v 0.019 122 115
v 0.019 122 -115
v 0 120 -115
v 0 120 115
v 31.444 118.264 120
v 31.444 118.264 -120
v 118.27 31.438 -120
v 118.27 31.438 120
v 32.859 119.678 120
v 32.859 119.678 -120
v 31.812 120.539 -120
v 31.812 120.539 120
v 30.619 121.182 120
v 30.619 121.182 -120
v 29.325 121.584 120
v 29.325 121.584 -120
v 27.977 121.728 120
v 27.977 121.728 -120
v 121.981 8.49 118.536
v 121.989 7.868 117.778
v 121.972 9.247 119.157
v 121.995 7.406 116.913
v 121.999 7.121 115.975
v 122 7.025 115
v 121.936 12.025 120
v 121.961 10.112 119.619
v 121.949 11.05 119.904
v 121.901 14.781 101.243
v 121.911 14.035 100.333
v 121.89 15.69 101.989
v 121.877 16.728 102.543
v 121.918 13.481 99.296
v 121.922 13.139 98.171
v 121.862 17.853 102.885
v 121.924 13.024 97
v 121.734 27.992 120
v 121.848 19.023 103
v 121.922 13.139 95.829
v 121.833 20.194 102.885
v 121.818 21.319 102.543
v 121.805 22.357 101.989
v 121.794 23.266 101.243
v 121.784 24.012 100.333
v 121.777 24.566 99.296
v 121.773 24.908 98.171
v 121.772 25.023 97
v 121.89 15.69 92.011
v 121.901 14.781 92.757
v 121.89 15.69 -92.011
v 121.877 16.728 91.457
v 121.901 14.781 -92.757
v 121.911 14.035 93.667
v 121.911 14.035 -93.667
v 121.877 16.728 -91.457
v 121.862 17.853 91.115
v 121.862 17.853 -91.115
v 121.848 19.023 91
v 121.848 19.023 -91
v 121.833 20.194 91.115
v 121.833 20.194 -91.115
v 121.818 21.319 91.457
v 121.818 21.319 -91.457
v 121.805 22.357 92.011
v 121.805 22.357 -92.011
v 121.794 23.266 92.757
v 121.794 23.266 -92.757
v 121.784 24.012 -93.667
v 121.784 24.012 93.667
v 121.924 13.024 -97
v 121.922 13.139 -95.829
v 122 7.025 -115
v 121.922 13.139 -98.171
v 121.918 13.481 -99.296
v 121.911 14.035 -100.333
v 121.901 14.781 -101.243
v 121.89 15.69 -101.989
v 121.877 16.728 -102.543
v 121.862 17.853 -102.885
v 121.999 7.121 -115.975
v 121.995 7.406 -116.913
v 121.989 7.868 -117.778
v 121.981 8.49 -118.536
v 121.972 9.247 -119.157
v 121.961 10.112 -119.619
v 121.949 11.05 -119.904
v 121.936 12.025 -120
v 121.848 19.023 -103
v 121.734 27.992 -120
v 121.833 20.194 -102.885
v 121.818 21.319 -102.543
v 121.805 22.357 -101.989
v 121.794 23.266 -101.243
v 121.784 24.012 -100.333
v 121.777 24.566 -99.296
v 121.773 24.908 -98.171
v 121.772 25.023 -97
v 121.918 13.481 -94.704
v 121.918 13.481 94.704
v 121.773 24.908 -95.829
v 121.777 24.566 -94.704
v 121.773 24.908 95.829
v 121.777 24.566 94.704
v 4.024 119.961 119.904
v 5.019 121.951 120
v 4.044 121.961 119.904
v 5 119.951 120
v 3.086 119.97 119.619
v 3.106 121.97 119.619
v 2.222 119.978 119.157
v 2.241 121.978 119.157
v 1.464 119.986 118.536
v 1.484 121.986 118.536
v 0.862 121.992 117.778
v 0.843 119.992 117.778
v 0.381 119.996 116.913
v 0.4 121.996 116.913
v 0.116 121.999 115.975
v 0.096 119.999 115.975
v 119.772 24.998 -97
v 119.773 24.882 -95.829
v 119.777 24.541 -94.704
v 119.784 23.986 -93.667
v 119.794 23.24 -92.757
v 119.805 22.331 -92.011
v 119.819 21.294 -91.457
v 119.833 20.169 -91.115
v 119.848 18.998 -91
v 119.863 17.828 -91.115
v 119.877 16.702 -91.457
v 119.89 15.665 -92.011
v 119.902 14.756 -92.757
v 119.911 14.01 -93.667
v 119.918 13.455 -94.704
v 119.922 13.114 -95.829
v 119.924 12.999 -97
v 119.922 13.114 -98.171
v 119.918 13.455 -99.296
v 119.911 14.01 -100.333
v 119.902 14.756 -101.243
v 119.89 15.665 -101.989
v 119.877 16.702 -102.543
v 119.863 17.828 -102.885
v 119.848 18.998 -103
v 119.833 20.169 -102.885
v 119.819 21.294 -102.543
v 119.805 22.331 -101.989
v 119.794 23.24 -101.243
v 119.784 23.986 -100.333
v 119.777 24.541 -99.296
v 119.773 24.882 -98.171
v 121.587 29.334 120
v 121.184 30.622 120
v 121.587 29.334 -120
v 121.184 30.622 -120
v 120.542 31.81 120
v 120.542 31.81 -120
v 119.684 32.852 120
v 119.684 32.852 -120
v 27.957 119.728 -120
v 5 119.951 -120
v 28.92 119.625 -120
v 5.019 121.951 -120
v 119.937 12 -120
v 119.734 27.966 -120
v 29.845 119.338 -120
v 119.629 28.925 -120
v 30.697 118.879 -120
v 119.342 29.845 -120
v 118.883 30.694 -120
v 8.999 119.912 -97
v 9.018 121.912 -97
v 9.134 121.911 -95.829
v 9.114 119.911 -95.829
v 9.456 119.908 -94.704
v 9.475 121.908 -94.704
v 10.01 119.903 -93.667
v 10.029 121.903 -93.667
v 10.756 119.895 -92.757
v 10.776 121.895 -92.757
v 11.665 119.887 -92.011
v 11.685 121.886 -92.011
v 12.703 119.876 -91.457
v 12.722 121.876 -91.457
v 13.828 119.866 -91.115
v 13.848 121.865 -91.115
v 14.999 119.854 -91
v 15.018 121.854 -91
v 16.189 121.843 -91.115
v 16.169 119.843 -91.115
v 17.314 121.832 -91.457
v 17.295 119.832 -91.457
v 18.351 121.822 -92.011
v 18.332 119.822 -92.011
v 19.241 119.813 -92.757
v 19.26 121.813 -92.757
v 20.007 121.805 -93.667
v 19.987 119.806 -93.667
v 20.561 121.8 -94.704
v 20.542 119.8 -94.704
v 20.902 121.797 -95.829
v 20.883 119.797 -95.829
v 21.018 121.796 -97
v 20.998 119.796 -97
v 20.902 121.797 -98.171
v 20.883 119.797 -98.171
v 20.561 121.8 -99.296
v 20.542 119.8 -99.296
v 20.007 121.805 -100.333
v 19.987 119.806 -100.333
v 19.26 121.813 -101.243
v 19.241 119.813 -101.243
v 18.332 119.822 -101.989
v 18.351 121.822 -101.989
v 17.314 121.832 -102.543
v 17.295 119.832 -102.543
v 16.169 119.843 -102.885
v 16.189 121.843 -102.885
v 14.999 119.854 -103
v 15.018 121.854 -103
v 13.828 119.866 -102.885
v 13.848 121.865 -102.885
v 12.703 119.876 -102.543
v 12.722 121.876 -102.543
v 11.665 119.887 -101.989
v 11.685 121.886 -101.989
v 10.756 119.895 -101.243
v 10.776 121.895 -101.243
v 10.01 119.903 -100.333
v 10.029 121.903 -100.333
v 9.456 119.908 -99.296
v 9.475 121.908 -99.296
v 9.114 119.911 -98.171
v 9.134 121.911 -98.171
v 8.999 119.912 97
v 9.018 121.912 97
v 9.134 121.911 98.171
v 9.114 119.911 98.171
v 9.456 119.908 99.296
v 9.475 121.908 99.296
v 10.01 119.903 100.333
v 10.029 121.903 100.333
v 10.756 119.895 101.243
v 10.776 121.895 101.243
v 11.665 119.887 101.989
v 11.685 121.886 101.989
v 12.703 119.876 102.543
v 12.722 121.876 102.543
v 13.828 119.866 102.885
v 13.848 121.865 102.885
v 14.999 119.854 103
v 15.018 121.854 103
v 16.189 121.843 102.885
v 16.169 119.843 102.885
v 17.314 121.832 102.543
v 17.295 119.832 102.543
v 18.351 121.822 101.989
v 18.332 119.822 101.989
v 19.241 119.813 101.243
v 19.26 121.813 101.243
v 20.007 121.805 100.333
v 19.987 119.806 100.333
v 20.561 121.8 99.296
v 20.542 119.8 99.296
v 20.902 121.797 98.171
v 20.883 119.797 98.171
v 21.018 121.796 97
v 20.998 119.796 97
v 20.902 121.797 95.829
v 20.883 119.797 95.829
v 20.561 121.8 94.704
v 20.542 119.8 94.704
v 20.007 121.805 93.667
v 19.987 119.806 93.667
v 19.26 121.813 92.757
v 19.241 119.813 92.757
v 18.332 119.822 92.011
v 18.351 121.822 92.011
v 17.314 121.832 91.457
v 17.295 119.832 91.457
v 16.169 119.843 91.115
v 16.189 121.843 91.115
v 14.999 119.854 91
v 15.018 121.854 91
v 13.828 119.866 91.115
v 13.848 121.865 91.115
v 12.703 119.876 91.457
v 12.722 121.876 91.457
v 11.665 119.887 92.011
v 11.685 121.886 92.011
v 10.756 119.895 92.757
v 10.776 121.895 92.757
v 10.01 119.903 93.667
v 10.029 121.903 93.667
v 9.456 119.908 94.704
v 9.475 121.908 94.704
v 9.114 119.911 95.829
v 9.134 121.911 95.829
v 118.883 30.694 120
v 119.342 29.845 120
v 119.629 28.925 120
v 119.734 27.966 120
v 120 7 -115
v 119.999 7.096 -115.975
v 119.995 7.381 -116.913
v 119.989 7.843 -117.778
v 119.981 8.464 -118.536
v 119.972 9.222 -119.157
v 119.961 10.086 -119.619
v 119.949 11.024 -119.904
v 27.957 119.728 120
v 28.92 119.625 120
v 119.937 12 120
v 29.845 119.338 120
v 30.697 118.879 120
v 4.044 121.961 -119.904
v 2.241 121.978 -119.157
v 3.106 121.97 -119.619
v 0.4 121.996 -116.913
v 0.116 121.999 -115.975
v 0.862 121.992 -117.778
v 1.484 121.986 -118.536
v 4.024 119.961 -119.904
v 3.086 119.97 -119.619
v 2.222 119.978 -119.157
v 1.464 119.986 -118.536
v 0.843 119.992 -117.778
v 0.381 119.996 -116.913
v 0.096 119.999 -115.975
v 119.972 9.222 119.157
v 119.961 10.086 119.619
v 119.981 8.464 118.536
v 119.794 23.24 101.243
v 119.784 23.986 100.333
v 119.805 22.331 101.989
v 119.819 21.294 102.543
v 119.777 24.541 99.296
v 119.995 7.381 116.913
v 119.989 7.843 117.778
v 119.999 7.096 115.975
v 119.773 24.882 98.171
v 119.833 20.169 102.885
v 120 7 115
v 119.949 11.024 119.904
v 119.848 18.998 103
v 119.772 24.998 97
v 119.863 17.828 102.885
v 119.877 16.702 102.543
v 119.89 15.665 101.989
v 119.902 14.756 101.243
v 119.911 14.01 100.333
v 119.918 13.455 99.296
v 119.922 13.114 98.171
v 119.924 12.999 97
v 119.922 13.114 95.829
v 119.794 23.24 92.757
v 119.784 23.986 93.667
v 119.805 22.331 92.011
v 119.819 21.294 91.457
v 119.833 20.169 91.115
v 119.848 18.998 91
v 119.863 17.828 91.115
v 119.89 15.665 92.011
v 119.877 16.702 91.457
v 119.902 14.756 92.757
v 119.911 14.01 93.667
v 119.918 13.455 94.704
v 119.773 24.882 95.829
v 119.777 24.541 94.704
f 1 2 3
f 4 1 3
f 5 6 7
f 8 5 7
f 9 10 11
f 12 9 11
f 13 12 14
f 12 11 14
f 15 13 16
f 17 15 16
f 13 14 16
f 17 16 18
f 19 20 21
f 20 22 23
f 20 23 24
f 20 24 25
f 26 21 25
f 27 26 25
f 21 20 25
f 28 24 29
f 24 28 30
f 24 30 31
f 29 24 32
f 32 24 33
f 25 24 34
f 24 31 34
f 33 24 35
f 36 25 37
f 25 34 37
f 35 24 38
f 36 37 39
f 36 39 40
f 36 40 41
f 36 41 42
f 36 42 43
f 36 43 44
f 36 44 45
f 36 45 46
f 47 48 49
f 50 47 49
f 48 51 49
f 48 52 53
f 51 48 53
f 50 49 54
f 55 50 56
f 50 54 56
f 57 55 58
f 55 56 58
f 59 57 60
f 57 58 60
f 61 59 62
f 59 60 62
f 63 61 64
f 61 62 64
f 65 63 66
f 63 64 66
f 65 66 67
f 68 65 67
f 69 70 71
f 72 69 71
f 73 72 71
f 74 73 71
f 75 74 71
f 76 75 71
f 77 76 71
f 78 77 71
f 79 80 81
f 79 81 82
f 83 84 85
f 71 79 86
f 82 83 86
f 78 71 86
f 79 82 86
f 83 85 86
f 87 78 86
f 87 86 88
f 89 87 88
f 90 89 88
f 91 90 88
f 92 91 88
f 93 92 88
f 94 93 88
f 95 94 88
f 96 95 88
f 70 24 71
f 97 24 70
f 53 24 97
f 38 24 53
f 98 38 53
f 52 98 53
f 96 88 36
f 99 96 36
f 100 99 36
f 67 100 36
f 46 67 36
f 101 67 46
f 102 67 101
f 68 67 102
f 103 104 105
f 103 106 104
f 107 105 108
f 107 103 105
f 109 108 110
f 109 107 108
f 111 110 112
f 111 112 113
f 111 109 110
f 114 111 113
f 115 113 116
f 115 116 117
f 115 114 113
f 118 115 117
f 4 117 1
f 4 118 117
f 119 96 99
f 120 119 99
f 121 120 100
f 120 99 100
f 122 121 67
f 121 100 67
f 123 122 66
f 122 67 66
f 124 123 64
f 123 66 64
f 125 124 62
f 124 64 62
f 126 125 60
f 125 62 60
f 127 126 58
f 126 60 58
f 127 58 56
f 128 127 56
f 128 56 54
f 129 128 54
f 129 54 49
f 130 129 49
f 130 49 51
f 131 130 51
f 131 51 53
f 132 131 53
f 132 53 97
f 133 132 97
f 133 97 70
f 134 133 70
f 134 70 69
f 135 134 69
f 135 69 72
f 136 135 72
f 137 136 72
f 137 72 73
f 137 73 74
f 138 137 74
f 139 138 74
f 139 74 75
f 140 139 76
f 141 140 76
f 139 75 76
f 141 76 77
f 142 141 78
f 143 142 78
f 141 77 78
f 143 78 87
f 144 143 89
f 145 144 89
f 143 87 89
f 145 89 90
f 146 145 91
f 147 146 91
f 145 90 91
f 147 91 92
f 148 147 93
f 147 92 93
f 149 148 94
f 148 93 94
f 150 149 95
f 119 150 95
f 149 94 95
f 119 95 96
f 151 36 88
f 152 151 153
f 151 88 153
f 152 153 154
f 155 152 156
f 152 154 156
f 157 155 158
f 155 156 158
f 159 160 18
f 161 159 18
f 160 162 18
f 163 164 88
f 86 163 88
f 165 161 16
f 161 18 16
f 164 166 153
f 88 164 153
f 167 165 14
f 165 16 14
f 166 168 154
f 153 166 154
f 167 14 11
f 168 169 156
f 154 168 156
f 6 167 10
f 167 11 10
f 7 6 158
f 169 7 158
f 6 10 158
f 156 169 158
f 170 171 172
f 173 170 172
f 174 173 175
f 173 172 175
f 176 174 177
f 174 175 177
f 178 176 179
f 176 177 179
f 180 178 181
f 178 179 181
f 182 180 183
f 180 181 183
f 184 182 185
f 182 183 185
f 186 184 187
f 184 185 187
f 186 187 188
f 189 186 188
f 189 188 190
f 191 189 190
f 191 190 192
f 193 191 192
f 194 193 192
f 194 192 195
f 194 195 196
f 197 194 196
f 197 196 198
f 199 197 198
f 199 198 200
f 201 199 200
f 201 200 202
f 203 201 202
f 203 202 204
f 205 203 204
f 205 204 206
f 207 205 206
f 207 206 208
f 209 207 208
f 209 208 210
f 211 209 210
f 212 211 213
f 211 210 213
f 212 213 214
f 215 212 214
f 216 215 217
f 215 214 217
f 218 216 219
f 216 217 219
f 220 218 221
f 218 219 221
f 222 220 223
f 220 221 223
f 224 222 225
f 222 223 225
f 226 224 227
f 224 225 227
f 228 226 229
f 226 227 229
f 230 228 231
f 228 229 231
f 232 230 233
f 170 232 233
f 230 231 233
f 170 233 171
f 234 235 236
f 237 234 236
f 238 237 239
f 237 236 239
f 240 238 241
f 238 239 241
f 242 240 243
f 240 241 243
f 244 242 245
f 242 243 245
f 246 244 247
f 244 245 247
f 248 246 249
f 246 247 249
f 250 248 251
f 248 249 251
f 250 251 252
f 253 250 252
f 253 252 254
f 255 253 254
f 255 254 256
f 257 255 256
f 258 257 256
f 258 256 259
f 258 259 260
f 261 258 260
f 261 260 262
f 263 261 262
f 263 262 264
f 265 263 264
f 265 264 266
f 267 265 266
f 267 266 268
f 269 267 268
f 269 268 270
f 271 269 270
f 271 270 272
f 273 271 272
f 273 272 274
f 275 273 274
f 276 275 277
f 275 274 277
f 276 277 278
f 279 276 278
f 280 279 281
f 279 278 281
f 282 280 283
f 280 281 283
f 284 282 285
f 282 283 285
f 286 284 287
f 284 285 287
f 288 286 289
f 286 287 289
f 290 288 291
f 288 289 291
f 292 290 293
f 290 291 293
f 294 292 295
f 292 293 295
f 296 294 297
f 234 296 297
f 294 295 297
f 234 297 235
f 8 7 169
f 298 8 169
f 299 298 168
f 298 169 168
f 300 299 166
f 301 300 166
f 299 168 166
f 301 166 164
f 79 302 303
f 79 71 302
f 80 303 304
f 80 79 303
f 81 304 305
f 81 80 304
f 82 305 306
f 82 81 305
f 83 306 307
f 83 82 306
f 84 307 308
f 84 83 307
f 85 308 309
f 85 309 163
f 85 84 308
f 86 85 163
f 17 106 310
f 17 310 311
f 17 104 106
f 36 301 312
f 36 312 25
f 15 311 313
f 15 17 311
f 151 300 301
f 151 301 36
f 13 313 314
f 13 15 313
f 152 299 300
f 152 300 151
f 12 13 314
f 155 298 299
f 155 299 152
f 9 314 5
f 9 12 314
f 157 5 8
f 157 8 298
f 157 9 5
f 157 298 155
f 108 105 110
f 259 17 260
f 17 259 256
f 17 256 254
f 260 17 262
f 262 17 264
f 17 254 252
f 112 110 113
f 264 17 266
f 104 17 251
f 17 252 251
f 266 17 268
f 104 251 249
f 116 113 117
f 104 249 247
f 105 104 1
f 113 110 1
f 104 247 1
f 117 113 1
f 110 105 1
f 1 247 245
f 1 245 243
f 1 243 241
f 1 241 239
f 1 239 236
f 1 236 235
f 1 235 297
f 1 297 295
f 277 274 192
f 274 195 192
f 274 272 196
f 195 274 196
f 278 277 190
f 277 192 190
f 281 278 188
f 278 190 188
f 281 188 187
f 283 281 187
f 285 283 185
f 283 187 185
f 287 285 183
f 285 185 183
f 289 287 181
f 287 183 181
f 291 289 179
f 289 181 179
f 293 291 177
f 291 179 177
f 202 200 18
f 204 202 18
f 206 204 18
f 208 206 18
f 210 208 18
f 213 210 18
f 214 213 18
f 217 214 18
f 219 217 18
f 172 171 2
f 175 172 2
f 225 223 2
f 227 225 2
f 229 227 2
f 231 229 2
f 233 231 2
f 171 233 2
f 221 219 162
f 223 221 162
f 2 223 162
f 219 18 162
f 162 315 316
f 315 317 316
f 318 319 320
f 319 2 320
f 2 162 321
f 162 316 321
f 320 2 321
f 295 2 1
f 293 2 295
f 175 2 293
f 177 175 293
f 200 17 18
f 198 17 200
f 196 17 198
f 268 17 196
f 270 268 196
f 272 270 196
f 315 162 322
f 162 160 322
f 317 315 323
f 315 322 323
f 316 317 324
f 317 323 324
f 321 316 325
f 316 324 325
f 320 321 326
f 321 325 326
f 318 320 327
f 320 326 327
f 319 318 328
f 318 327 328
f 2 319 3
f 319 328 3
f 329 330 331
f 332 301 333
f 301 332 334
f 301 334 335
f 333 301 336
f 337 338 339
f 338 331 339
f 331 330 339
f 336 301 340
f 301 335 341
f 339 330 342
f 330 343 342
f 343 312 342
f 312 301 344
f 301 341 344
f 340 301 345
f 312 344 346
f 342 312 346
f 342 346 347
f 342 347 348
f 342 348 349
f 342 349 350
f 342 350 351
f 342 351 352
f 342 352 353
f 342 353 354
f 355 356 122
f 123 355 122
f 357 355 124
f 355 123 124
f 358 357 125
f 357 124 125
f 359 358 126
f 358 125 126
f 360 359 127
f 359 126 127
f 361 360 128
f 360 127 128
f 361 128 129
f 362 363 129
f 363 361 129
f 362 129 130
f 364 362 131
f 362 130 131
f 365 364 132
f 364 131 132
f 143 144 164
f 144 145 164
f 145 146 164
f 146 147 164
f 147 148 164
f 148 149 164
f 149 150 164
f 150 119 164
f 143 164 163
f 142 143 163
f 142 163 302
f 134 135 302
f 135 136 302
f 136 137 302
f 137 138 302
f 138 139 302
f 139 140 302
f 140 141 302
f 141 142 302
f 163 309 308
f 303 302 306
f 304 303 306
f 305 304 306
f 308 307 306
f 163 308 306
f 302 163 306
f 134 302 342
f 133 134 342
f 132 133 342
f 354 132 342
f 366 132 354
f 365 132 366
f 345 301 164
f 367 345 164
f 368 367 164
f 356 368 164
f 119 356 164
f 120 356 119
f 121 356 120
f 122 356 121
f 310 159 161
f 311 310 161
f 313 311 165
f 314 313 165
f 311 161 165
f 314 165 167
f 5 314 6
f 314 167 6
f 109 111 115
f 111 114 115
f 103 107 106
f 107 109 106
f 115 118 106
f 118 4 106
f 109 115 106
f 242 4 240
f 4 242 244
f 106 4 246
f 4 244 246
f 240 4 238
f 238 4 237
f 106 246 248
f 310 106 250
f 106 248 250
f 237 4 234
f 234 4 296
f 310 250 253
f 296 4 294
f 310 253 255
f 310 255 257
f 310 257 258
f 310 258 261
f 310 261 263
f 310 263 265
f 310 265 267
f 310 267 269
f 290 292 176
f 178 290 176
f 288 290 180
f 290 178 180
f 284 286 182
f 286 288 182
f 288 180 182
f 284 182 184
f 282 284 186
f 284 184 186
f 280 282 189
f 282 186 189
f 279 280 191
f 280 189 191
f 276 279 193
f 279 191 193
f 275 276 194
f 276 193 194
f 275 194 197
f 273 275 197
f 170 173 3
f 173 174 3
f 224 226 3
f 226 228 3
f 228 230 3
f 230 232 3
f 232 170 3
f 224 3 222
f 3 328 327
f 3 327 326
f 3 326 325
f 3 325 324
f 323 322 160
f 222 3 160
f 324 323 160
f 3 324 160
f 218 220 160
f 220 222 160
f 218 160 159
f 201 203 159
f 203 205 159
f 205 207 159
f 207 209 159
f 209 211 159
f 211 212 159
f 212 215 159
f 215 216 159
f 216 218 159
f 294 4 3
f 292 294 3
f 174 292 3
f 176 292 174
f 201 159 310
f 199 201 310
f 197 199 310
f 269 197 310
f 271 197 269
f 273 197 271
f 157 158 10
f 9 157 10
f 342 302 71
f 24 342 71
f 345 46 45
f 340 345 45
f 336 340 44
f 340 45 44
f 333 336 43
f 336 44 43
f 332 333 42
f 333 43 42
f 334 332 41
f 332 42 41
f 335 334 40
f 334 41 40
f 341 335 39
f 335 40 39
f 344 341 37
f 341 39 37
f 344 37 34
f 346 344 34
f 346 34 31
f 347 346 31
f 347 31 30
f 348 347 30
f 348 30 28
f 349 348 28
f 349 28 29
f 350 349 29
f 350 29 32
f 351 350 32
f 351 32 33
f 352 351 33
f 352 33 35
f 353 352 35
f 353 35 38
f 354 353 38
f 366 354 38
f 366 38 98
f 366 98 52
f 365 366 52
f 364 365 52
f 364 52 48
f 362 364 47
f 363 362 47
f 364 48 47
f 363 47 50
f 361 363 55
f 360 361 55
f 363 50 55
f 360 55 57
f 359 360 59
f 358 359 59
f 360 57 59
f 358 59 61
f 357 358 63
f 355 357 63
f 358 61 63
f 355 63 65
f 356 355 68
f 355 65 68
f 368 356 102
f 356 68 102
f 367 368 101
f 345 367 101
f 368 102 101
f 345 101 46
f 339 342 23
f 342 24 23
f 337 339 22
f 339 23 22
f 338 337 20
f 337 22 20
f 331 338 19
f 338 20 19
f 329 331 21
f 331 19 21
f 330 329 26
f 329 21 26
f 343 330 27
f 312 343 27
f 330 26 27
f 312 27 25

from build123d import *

# Parameters (mm, degrees)
ESTRUSIONE_SOTTILE1_DEPTH      = 120
ESTRUSIONE_SOTTILE1_DEPTH_BACK = 120
RACCORDO1_R                    = 5
RACCORDO2_R                    = 5
SCHIZZO8_R                     = 6
TAGLIO_ESTRUSIONE1_DEPTH       = 210.306999049
SCHIZZO7_R                     = 6
TAGLIO_ESTRUSIONE2_DEPTH       = 206.470737868


with BuildPart() as part:
    # Schizzo1 → Estrusione-Sottile1 (new, two sides: drawn at the far end of the back side and taken through both)
    with BuildSketch(Plane.XY.offset(-ESTRUSIONE_SOTTILE1_DEPTH_BACK)):
        with BuildLine():
            Line((0, 120), (27.957459223, 119.728070778))
            ThreePointArc((27.957459223, 119.728070778), (29.844687952, 119.338345184), (31.444362752, 118.263841181))
            Line((31.444362752, 118.263841181), (118.269943122, 31.43826081))
            ThreePointArc((118.269943122, 31.43826081), (119.341577126, 29.845406459), (119.734006879, 27.966155728))
            Line((119.734006879, 27.966155728), (120, 7))
            Line((120, 7), (121.999839065, 7.025371529))
            Line((121.999839065, 7.025371529), (121.733845944, 27.991527257))
            ThreePointArc((121.733845944, 27.991527257), (121.18444429, 30.622478281), (119.684156685, 32.852474373))
            Line((119.684156685, 32.852474373), (32.858576314, 119.678054743))
            ThreePointArc((32.858576314, 119.678054743), (30.619031595, 121.182360347), (27.976911374, 121.727976179))
            Line((27.976911374, 121.727976179), (0.019452151, 121.999905401))
            Line((0.019452151, 121.999905401), (0, 120))
        make_face()
    extrude(amount=ESTRUSIONE_SOTTILE1_DEPTH + ESTRUSIONE_SOTTILE1_DEPTH_BACK)

    # Raccordo1
    raccordo1_edges = [part.edges().sort_by_distance(p)[0] for p in [
        (120.999919532, 7.012685765, 120),
        (120.999919532, 7.012685765, -120),
    ]]
    fillet(raccordo1_edges, radius=RACCORDO1_R)

    # Raccordo2
    raccordo2_edges = [part.edges().sort_by_distance(p)[0] for p in [
        (0.009726076, 120.999952701, 120),
        (0.009726076, 120.999952701, -120),
    ]]
    fillet(raccordo2_edges, radius=RACCORDO2_R)

    # Schizzo8 → Taglio-Estrusione1 (cut, through all)
    with BuildSketch(Plane(origin=(122.069320837, 1.548667295, 0), x_dir=(0, 0, -1), z_dir=(0.9999195324498686, 0.012685764668954389, 0))):
        with Locations(Location((-97, 17.476179356, 0), (0, 0, 90))):
            Circle(SCHIZZO8_R)
        with Locations(Location((97, 17.476179356, 0), (0, 0, 90))):
            Circle(SCHIZZO8_R)
    extrude(amount=-TAGLIO_ESTRUSIONE1_DEPTH, mode=Mode.SUBTRACT)

    # Schizzo7 → Taglio-Estrusione2 (cut, through all)
    with BuildSketch(Plane(origin=(1.186526009, 121.988553816, 0), x_dir=(0.9999527006088332, -0.00972607552414292, 0), z_dir=(0.00972607552414292, 0.9999527006088332, 0))):
        with Locations(Location((13.832161446, -97, 0), (0, 0, 180))):
            Circle(SCHIZZO7_R)
        with Locations(Location((13.832161446, 97, 0), (0, 0, 180))):
            Circle(SCHIZZO7_R)
    extrude(amount=-TAGLIO_ESTRUSIONE2_DEPTH, mode=Mode.SUBTRACT)


solid = part.part
